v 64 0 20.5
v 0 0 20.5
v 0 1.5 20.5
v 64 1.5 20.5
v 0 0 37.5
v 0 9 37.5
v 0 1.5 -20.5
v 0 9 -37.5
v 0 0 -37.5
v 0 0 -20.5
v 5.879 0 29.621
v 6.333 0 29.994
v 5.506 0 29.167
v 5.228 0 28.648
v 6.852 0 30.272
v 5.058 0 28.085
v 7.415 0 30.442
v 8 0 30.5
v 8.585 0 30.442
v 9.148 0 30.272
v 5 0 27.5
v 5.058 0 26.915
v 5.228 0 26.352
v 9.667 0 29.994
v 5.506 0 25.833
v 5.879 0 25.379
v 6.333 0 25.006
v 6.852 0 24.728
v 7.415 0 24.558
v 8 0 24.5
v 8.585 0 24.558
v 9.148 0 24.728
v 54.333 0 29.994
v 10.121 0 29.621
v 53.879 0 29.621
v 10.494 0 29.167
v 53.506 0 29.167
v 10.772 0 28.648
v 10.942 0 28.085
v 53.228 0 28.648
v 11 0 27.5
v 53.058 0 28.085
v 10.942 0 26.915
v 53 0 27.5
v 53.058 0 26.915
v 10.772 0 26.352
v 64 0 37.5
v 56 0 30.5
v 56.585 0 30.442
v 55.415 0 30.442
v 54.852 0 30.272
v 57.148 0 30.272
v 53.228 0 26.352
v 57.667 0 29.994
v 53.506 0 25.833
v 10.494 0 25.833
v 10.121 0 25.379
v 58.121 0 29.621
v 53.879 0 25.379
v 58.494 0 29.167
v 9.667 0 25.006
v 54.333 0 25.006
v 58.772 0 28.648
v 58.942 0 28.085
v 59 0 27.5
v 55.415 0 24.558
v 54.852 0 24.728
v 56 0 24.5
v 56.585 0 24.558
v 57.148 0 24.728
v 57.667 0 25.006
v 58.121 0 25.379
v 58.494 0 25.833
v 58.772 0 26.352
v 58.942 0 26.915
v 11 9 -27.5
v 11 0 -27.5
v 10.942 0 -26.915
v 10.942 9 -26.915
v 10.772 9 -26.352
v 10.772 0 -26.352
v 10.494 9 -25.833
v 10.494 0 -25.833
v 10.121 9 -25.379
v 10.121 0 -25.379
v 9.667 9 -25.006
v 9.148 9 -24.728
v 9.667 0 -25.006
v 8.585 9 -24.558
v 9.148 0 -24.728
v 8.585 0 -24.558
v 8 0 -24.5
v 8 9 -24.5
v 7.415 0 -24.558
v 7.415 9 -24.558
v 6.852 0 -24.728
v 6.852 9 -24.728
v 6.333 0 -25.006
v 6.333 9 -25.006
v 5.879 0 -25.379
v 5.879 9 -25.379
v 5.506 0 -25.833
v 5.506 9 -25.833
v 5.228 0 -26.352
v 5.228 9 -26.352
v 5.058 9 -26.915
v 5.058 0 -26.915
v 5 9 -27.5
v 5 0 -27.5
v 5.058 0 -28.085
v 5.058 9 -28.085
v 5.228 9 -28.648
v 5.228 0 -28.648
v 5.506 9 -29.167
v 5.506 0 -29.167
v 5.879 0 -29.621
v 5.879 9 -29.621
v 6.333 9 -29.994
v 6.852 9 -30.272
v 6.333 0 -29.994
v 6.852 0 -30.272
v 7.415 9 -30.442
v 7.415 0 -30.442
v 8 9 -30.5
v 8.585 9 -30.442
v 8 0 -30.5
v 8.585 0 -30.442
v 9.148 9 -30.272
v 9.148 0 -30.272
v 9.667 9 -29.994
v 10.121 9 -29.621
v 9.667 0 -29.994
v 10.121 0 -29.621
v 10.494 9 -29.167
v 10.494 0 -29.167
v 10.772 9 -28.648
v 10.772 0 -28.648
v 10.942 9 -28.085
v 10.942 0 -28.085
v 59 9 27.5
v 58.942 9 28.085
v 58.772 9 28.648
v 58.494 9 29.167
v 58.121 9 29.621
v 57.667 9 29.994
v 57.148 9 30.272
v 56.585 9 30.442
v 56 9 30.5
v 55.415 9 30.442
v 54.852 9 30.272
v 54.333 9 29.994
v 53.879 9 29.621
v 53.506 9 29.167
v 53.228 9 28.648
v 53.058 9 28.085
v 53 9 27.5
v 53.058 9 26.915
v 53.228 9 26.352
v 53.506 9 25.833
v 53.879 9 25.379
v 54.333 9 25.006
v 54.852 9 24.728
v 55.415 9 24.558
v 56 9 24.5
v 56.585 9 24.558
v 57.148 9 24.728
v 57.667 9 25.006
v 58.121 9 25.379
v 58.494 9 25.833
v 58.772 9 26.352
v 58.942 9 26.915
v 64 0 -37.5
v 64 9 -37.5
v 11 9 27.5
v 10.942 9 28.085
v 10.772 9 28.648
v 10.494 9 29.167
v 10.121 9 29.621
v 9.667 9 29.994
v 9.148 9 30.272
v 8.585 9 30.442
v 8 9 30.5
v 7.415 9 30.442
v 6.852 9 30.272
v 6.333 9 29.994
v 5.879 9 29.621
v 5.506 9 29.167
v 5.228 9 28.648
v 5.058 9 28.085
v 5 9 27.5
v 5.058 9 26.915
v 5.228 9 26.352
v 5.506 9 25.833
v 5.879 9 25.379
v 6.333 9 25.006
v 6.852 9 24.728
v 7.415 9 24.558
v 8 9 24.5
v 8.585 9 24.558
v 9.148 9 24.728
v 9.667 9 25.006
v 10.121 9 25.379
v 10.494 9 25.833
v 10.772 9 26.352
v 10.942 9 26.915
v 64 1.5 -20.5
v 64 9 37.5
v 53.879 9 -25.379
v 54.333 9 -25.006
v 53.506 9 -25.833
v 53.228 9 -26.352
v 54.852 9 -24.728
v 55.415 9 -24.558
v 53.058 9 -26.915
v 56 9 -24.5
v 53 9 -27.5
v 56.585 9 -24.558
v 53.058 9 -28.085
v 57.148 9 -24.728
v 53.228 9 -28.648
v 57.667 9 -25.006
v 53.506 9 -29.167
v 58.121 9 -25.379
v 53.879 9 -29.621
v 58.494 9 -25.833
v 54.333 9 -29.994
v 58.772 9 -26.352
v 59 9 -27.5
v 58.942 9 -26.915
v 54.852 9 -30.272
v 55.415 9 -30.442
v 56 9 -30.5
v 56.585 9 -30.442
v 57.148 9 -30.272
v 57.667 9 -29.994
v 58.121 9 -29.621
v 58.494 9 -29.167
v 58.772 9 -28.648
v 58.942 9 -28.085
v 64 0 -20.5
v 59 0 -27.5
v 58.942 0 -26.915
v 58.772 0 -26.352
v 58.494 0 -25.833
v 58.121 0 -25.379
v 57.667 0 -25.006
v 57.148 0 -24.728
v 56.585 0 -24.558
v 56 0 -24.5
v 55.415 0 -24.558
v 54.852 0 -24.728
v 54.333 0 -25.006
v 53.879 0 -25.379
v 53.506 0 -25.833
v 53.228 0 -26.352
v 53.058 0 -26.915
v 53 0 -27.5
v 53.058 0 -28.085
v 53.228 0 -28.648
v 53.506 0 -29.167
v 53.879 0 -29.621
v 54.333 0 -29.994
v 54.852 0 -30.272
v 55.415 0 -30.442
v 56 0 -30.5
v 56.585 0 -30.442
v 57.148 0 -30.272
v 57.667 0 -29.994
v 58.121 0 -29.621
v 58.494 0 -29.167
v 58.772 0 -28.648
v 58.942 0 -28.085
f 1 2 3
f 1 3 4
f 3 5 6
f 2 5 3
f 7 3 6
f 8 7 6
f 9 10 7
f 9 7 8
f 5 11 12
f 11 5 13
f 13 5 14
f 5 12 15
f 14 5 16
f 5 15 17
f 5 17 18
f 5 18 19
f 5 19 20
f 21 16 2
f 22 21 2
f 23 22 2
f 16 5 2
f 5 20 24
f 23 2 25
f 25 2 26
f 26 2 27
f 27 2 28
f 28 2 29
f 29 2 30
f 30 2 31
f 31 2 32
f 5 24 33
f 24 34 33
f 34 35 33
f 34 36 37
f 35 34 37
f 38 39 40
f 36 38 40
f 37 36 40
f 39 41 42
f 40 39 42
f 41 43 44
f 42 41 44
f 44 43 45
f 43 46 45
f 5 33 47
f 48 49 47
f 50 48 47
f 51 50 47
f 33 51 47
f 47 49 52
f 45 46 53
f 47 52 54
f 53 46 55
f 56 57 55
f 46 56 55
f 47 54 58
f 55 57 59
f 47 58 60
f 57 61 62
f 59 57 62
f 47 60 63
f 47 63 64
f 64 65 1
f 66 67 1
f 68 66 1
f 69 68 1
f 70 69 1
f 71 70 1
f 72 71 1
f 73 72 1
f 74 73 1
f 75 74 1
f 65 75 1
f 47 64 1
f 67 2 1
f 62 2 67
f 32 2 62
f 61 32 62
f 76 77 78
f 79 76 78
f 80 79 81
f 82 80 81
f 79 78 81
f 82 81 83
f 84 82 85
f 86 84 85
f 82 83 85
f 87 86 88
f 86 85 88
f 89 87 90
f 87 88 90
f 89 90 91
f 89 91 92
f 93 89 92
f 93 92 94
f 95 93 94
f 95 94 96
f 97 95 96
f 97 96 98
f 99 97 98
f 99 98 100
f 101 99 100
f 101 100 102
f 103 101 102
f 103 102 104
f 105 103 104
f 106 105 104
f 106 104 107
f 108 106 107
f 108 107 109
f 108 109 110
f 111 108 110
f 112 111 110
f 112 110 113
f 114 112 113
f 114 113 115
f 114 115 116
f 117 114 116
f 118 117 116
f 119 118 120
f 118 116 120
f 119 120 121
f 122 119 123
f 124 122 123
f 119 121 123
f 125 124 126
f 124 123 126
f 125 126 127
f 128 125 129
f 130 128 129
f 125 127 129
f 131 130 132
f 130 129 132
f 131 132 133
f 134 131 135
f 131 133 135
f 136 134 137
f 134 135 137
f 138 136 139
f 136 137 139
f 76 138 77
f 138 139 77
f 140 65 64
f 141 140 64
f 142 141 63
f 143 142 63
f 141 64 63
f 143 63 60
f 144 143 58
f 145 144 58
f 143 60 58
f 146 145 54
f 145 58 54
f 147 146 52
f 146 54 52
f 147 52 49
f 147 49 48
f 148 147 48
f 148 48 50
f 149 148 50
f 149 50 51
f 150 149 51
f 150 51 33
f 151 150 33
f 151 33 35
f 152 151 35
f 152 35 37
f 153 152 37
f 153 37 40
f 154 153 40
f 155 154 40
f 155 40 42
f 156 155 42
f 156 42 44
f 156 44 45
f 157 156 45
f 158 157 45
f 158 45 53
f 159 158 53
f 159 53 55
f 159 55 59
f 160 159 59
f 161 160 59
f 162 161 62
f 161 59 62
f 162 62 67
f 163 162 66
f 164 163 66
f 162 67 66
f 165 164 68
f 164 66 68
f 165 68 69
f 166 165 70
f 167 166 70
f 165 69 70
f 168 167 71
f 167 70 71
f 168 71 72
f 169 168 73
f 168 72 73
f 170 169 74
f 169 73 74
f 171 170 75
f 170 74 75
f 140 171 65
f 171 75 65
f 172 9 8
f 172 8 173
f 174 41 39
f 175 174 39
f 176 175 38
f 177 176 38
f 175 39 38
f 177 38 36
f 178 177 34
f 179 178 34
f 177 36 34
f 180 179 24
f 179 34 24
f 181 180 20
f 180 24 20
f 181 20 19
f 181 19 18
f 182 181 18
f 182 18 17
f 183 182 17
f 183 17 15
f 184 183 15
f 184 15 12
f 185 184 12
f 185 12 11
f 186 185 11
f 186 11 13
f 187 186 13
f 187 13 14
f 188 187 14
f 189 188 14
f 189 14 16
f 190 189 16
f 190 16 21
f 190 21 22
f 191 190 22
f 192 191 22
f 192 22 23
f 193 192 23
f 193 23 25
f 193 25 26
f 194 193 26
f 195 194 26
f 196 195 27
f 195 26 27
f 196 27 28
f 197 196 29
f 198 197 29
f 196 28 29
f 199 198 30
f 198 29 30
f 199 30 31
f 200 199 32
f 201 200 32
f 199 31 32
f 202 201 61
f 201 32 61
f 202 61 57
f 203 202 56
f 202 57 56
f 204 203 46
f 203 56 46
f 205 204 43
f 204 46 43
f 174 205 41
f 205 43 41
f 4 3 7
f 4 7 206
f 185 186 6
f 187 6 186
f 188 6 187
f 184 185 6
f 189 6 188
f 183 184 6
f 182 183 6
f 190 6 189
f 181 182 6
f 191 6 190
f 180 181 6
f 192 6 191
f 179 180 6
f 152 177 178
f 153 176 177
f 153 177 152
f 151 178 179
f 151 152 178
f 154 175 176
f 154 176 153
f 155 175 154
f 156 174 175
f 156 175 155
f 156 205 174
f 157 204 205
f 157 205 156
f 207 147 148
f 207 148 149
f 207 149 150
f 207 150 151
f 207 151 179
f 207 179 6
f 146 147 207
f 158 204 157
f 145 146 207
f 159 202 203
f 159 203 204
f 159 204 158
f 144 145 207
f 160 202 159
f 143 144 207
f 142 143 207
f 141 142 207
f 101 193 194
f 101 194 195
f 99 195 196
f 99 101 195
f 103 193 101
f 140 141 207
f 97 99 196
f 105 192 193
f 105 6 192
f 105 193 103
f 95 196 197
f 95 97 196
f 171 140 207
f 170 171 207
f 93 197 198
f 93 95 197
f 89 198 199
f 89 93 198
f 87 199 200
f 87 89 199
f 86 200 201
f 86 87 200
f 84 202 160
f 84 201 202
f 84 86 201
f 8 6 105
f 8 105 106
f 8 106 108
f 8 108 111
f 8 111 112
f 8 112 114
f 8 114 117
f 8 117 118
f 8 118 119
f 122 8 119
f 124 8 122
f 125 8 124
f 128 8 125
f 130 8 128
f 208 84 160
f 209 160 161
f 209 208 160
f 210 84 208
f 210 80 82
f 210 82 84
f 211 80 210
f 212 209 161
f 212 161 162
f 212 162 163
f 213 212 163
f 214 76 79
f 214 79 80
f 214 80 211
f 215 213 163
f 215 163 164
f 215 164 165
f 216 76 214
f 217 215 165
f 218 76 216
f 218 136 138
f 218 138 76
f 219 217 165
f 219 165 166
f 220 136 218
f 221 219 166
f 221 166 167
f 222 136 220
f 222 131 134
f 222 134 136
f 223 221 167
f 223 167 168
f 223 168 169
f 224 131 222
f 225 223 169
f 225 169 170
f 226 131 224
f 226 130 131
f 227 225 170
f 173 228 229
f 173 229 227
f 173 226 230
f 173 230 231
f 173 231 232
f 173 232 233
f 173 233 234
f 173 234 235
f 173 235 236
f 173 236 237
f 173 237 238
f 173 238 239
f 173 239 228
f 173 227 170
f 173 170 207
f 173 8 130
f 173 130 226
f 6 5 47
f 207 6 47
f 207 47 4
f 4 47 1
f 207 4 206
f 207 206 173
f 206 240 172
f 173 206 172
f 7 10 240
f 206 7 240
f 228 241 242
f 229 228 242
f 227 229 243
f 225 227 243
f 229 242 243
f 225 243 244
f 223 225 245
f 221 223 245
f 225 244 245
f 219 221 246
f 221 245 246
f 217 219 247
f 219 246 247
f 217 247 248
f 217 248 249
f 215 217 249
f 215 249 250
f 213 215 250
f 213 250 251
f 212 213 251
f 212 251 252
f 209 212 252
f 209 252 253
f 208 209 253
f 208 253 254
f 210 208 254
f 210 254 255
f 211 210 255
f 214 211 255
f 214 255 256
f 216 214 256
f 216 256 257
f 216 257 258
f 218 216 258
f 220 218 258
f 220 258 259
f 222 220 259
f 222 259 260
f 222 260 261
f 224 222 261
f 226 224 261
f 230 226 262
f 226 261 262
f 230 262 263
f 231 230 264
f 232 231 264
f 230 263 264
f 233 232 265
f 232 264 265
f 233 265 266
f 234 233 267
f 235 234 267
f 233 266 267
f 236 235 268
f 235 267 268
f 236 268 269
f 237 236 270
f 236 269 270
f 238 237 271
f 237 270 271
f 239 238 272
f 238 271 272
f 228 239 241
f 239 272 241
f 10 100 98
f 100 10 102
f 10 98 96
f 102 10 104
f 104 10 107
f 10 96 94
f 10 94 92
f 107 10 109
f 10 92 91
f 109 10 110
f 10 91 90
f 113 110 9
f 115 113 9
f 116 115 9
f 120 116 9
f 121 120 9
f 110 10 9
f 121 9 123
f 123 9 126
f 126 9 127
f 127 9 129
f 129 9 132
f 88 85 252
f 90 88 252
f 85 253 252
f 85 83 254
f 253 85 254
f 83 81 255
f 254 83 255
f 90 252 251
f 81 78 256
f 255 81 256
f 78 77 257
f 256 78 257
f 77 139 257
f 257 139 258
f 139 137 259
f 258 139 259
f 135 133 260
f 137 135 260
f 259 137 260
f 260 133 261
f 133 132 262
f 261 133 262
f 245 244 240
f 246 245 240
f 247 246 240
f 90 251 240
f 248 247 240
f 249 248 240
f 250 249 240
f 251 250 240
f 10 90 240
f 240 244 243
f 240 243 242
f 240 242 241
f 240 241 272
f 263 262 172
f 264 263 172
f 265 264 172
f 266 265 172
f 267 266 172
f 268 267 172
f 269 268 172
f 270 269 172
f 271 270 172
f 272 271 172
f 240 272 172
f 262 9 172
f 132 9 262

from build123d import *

# Parameters (mm, degrees)
SKETCH1_W                = 64
SKETCH1_H                = 75
BOSS_EXTRUDE1_DEPTH      = 9
SKETCH2_W                = 64
SKETCH2_H                = 41
CUT_EXTRUDE1_DEPTH       = 1.5
F_6_0_6_DIAMETER_HOLE1_D = 6


with BuildPart() as part:
    # Sketch1 → Boss-Extrude1 (new body)
    with BuildSketch(Plane(origin=(0, 0, 0), x_dir=(1, 0, 0), z_dir=(0, 1, 0))):
        with Locations((32, 0)):
            Rectangle(SKETCH1_W, SKETCH1_H)
    extrude(amount=BOSS_EXTRUDE1_DEPTH)

    # Sketch2 → Cut-Extrude1 (cut)
    with BuildSketch(Plane.XZ):
        with Locations((32, 0)):
            Rectangle(SKETCH2_W, SKETCH2_H)
    extrude(amount=-CUT_EXTRUDE1_DEPTH, mode=Mode.SUBTRACT)

    # Ø6.0 (6) Diameter Hole1 (through all)
    with Locations(Plane(origin=(0, 9, 0), x_dir=(-1, 0, 0), z_dir=(0, 1, 0))):
        with Locations((-8, 27.5), (-8, -27.5), (-56, -27.5), (-56, 27.5)):
            Hole(F_6_0_6_DIAMETER_HOLE1_D / 2)


solid = part.part
